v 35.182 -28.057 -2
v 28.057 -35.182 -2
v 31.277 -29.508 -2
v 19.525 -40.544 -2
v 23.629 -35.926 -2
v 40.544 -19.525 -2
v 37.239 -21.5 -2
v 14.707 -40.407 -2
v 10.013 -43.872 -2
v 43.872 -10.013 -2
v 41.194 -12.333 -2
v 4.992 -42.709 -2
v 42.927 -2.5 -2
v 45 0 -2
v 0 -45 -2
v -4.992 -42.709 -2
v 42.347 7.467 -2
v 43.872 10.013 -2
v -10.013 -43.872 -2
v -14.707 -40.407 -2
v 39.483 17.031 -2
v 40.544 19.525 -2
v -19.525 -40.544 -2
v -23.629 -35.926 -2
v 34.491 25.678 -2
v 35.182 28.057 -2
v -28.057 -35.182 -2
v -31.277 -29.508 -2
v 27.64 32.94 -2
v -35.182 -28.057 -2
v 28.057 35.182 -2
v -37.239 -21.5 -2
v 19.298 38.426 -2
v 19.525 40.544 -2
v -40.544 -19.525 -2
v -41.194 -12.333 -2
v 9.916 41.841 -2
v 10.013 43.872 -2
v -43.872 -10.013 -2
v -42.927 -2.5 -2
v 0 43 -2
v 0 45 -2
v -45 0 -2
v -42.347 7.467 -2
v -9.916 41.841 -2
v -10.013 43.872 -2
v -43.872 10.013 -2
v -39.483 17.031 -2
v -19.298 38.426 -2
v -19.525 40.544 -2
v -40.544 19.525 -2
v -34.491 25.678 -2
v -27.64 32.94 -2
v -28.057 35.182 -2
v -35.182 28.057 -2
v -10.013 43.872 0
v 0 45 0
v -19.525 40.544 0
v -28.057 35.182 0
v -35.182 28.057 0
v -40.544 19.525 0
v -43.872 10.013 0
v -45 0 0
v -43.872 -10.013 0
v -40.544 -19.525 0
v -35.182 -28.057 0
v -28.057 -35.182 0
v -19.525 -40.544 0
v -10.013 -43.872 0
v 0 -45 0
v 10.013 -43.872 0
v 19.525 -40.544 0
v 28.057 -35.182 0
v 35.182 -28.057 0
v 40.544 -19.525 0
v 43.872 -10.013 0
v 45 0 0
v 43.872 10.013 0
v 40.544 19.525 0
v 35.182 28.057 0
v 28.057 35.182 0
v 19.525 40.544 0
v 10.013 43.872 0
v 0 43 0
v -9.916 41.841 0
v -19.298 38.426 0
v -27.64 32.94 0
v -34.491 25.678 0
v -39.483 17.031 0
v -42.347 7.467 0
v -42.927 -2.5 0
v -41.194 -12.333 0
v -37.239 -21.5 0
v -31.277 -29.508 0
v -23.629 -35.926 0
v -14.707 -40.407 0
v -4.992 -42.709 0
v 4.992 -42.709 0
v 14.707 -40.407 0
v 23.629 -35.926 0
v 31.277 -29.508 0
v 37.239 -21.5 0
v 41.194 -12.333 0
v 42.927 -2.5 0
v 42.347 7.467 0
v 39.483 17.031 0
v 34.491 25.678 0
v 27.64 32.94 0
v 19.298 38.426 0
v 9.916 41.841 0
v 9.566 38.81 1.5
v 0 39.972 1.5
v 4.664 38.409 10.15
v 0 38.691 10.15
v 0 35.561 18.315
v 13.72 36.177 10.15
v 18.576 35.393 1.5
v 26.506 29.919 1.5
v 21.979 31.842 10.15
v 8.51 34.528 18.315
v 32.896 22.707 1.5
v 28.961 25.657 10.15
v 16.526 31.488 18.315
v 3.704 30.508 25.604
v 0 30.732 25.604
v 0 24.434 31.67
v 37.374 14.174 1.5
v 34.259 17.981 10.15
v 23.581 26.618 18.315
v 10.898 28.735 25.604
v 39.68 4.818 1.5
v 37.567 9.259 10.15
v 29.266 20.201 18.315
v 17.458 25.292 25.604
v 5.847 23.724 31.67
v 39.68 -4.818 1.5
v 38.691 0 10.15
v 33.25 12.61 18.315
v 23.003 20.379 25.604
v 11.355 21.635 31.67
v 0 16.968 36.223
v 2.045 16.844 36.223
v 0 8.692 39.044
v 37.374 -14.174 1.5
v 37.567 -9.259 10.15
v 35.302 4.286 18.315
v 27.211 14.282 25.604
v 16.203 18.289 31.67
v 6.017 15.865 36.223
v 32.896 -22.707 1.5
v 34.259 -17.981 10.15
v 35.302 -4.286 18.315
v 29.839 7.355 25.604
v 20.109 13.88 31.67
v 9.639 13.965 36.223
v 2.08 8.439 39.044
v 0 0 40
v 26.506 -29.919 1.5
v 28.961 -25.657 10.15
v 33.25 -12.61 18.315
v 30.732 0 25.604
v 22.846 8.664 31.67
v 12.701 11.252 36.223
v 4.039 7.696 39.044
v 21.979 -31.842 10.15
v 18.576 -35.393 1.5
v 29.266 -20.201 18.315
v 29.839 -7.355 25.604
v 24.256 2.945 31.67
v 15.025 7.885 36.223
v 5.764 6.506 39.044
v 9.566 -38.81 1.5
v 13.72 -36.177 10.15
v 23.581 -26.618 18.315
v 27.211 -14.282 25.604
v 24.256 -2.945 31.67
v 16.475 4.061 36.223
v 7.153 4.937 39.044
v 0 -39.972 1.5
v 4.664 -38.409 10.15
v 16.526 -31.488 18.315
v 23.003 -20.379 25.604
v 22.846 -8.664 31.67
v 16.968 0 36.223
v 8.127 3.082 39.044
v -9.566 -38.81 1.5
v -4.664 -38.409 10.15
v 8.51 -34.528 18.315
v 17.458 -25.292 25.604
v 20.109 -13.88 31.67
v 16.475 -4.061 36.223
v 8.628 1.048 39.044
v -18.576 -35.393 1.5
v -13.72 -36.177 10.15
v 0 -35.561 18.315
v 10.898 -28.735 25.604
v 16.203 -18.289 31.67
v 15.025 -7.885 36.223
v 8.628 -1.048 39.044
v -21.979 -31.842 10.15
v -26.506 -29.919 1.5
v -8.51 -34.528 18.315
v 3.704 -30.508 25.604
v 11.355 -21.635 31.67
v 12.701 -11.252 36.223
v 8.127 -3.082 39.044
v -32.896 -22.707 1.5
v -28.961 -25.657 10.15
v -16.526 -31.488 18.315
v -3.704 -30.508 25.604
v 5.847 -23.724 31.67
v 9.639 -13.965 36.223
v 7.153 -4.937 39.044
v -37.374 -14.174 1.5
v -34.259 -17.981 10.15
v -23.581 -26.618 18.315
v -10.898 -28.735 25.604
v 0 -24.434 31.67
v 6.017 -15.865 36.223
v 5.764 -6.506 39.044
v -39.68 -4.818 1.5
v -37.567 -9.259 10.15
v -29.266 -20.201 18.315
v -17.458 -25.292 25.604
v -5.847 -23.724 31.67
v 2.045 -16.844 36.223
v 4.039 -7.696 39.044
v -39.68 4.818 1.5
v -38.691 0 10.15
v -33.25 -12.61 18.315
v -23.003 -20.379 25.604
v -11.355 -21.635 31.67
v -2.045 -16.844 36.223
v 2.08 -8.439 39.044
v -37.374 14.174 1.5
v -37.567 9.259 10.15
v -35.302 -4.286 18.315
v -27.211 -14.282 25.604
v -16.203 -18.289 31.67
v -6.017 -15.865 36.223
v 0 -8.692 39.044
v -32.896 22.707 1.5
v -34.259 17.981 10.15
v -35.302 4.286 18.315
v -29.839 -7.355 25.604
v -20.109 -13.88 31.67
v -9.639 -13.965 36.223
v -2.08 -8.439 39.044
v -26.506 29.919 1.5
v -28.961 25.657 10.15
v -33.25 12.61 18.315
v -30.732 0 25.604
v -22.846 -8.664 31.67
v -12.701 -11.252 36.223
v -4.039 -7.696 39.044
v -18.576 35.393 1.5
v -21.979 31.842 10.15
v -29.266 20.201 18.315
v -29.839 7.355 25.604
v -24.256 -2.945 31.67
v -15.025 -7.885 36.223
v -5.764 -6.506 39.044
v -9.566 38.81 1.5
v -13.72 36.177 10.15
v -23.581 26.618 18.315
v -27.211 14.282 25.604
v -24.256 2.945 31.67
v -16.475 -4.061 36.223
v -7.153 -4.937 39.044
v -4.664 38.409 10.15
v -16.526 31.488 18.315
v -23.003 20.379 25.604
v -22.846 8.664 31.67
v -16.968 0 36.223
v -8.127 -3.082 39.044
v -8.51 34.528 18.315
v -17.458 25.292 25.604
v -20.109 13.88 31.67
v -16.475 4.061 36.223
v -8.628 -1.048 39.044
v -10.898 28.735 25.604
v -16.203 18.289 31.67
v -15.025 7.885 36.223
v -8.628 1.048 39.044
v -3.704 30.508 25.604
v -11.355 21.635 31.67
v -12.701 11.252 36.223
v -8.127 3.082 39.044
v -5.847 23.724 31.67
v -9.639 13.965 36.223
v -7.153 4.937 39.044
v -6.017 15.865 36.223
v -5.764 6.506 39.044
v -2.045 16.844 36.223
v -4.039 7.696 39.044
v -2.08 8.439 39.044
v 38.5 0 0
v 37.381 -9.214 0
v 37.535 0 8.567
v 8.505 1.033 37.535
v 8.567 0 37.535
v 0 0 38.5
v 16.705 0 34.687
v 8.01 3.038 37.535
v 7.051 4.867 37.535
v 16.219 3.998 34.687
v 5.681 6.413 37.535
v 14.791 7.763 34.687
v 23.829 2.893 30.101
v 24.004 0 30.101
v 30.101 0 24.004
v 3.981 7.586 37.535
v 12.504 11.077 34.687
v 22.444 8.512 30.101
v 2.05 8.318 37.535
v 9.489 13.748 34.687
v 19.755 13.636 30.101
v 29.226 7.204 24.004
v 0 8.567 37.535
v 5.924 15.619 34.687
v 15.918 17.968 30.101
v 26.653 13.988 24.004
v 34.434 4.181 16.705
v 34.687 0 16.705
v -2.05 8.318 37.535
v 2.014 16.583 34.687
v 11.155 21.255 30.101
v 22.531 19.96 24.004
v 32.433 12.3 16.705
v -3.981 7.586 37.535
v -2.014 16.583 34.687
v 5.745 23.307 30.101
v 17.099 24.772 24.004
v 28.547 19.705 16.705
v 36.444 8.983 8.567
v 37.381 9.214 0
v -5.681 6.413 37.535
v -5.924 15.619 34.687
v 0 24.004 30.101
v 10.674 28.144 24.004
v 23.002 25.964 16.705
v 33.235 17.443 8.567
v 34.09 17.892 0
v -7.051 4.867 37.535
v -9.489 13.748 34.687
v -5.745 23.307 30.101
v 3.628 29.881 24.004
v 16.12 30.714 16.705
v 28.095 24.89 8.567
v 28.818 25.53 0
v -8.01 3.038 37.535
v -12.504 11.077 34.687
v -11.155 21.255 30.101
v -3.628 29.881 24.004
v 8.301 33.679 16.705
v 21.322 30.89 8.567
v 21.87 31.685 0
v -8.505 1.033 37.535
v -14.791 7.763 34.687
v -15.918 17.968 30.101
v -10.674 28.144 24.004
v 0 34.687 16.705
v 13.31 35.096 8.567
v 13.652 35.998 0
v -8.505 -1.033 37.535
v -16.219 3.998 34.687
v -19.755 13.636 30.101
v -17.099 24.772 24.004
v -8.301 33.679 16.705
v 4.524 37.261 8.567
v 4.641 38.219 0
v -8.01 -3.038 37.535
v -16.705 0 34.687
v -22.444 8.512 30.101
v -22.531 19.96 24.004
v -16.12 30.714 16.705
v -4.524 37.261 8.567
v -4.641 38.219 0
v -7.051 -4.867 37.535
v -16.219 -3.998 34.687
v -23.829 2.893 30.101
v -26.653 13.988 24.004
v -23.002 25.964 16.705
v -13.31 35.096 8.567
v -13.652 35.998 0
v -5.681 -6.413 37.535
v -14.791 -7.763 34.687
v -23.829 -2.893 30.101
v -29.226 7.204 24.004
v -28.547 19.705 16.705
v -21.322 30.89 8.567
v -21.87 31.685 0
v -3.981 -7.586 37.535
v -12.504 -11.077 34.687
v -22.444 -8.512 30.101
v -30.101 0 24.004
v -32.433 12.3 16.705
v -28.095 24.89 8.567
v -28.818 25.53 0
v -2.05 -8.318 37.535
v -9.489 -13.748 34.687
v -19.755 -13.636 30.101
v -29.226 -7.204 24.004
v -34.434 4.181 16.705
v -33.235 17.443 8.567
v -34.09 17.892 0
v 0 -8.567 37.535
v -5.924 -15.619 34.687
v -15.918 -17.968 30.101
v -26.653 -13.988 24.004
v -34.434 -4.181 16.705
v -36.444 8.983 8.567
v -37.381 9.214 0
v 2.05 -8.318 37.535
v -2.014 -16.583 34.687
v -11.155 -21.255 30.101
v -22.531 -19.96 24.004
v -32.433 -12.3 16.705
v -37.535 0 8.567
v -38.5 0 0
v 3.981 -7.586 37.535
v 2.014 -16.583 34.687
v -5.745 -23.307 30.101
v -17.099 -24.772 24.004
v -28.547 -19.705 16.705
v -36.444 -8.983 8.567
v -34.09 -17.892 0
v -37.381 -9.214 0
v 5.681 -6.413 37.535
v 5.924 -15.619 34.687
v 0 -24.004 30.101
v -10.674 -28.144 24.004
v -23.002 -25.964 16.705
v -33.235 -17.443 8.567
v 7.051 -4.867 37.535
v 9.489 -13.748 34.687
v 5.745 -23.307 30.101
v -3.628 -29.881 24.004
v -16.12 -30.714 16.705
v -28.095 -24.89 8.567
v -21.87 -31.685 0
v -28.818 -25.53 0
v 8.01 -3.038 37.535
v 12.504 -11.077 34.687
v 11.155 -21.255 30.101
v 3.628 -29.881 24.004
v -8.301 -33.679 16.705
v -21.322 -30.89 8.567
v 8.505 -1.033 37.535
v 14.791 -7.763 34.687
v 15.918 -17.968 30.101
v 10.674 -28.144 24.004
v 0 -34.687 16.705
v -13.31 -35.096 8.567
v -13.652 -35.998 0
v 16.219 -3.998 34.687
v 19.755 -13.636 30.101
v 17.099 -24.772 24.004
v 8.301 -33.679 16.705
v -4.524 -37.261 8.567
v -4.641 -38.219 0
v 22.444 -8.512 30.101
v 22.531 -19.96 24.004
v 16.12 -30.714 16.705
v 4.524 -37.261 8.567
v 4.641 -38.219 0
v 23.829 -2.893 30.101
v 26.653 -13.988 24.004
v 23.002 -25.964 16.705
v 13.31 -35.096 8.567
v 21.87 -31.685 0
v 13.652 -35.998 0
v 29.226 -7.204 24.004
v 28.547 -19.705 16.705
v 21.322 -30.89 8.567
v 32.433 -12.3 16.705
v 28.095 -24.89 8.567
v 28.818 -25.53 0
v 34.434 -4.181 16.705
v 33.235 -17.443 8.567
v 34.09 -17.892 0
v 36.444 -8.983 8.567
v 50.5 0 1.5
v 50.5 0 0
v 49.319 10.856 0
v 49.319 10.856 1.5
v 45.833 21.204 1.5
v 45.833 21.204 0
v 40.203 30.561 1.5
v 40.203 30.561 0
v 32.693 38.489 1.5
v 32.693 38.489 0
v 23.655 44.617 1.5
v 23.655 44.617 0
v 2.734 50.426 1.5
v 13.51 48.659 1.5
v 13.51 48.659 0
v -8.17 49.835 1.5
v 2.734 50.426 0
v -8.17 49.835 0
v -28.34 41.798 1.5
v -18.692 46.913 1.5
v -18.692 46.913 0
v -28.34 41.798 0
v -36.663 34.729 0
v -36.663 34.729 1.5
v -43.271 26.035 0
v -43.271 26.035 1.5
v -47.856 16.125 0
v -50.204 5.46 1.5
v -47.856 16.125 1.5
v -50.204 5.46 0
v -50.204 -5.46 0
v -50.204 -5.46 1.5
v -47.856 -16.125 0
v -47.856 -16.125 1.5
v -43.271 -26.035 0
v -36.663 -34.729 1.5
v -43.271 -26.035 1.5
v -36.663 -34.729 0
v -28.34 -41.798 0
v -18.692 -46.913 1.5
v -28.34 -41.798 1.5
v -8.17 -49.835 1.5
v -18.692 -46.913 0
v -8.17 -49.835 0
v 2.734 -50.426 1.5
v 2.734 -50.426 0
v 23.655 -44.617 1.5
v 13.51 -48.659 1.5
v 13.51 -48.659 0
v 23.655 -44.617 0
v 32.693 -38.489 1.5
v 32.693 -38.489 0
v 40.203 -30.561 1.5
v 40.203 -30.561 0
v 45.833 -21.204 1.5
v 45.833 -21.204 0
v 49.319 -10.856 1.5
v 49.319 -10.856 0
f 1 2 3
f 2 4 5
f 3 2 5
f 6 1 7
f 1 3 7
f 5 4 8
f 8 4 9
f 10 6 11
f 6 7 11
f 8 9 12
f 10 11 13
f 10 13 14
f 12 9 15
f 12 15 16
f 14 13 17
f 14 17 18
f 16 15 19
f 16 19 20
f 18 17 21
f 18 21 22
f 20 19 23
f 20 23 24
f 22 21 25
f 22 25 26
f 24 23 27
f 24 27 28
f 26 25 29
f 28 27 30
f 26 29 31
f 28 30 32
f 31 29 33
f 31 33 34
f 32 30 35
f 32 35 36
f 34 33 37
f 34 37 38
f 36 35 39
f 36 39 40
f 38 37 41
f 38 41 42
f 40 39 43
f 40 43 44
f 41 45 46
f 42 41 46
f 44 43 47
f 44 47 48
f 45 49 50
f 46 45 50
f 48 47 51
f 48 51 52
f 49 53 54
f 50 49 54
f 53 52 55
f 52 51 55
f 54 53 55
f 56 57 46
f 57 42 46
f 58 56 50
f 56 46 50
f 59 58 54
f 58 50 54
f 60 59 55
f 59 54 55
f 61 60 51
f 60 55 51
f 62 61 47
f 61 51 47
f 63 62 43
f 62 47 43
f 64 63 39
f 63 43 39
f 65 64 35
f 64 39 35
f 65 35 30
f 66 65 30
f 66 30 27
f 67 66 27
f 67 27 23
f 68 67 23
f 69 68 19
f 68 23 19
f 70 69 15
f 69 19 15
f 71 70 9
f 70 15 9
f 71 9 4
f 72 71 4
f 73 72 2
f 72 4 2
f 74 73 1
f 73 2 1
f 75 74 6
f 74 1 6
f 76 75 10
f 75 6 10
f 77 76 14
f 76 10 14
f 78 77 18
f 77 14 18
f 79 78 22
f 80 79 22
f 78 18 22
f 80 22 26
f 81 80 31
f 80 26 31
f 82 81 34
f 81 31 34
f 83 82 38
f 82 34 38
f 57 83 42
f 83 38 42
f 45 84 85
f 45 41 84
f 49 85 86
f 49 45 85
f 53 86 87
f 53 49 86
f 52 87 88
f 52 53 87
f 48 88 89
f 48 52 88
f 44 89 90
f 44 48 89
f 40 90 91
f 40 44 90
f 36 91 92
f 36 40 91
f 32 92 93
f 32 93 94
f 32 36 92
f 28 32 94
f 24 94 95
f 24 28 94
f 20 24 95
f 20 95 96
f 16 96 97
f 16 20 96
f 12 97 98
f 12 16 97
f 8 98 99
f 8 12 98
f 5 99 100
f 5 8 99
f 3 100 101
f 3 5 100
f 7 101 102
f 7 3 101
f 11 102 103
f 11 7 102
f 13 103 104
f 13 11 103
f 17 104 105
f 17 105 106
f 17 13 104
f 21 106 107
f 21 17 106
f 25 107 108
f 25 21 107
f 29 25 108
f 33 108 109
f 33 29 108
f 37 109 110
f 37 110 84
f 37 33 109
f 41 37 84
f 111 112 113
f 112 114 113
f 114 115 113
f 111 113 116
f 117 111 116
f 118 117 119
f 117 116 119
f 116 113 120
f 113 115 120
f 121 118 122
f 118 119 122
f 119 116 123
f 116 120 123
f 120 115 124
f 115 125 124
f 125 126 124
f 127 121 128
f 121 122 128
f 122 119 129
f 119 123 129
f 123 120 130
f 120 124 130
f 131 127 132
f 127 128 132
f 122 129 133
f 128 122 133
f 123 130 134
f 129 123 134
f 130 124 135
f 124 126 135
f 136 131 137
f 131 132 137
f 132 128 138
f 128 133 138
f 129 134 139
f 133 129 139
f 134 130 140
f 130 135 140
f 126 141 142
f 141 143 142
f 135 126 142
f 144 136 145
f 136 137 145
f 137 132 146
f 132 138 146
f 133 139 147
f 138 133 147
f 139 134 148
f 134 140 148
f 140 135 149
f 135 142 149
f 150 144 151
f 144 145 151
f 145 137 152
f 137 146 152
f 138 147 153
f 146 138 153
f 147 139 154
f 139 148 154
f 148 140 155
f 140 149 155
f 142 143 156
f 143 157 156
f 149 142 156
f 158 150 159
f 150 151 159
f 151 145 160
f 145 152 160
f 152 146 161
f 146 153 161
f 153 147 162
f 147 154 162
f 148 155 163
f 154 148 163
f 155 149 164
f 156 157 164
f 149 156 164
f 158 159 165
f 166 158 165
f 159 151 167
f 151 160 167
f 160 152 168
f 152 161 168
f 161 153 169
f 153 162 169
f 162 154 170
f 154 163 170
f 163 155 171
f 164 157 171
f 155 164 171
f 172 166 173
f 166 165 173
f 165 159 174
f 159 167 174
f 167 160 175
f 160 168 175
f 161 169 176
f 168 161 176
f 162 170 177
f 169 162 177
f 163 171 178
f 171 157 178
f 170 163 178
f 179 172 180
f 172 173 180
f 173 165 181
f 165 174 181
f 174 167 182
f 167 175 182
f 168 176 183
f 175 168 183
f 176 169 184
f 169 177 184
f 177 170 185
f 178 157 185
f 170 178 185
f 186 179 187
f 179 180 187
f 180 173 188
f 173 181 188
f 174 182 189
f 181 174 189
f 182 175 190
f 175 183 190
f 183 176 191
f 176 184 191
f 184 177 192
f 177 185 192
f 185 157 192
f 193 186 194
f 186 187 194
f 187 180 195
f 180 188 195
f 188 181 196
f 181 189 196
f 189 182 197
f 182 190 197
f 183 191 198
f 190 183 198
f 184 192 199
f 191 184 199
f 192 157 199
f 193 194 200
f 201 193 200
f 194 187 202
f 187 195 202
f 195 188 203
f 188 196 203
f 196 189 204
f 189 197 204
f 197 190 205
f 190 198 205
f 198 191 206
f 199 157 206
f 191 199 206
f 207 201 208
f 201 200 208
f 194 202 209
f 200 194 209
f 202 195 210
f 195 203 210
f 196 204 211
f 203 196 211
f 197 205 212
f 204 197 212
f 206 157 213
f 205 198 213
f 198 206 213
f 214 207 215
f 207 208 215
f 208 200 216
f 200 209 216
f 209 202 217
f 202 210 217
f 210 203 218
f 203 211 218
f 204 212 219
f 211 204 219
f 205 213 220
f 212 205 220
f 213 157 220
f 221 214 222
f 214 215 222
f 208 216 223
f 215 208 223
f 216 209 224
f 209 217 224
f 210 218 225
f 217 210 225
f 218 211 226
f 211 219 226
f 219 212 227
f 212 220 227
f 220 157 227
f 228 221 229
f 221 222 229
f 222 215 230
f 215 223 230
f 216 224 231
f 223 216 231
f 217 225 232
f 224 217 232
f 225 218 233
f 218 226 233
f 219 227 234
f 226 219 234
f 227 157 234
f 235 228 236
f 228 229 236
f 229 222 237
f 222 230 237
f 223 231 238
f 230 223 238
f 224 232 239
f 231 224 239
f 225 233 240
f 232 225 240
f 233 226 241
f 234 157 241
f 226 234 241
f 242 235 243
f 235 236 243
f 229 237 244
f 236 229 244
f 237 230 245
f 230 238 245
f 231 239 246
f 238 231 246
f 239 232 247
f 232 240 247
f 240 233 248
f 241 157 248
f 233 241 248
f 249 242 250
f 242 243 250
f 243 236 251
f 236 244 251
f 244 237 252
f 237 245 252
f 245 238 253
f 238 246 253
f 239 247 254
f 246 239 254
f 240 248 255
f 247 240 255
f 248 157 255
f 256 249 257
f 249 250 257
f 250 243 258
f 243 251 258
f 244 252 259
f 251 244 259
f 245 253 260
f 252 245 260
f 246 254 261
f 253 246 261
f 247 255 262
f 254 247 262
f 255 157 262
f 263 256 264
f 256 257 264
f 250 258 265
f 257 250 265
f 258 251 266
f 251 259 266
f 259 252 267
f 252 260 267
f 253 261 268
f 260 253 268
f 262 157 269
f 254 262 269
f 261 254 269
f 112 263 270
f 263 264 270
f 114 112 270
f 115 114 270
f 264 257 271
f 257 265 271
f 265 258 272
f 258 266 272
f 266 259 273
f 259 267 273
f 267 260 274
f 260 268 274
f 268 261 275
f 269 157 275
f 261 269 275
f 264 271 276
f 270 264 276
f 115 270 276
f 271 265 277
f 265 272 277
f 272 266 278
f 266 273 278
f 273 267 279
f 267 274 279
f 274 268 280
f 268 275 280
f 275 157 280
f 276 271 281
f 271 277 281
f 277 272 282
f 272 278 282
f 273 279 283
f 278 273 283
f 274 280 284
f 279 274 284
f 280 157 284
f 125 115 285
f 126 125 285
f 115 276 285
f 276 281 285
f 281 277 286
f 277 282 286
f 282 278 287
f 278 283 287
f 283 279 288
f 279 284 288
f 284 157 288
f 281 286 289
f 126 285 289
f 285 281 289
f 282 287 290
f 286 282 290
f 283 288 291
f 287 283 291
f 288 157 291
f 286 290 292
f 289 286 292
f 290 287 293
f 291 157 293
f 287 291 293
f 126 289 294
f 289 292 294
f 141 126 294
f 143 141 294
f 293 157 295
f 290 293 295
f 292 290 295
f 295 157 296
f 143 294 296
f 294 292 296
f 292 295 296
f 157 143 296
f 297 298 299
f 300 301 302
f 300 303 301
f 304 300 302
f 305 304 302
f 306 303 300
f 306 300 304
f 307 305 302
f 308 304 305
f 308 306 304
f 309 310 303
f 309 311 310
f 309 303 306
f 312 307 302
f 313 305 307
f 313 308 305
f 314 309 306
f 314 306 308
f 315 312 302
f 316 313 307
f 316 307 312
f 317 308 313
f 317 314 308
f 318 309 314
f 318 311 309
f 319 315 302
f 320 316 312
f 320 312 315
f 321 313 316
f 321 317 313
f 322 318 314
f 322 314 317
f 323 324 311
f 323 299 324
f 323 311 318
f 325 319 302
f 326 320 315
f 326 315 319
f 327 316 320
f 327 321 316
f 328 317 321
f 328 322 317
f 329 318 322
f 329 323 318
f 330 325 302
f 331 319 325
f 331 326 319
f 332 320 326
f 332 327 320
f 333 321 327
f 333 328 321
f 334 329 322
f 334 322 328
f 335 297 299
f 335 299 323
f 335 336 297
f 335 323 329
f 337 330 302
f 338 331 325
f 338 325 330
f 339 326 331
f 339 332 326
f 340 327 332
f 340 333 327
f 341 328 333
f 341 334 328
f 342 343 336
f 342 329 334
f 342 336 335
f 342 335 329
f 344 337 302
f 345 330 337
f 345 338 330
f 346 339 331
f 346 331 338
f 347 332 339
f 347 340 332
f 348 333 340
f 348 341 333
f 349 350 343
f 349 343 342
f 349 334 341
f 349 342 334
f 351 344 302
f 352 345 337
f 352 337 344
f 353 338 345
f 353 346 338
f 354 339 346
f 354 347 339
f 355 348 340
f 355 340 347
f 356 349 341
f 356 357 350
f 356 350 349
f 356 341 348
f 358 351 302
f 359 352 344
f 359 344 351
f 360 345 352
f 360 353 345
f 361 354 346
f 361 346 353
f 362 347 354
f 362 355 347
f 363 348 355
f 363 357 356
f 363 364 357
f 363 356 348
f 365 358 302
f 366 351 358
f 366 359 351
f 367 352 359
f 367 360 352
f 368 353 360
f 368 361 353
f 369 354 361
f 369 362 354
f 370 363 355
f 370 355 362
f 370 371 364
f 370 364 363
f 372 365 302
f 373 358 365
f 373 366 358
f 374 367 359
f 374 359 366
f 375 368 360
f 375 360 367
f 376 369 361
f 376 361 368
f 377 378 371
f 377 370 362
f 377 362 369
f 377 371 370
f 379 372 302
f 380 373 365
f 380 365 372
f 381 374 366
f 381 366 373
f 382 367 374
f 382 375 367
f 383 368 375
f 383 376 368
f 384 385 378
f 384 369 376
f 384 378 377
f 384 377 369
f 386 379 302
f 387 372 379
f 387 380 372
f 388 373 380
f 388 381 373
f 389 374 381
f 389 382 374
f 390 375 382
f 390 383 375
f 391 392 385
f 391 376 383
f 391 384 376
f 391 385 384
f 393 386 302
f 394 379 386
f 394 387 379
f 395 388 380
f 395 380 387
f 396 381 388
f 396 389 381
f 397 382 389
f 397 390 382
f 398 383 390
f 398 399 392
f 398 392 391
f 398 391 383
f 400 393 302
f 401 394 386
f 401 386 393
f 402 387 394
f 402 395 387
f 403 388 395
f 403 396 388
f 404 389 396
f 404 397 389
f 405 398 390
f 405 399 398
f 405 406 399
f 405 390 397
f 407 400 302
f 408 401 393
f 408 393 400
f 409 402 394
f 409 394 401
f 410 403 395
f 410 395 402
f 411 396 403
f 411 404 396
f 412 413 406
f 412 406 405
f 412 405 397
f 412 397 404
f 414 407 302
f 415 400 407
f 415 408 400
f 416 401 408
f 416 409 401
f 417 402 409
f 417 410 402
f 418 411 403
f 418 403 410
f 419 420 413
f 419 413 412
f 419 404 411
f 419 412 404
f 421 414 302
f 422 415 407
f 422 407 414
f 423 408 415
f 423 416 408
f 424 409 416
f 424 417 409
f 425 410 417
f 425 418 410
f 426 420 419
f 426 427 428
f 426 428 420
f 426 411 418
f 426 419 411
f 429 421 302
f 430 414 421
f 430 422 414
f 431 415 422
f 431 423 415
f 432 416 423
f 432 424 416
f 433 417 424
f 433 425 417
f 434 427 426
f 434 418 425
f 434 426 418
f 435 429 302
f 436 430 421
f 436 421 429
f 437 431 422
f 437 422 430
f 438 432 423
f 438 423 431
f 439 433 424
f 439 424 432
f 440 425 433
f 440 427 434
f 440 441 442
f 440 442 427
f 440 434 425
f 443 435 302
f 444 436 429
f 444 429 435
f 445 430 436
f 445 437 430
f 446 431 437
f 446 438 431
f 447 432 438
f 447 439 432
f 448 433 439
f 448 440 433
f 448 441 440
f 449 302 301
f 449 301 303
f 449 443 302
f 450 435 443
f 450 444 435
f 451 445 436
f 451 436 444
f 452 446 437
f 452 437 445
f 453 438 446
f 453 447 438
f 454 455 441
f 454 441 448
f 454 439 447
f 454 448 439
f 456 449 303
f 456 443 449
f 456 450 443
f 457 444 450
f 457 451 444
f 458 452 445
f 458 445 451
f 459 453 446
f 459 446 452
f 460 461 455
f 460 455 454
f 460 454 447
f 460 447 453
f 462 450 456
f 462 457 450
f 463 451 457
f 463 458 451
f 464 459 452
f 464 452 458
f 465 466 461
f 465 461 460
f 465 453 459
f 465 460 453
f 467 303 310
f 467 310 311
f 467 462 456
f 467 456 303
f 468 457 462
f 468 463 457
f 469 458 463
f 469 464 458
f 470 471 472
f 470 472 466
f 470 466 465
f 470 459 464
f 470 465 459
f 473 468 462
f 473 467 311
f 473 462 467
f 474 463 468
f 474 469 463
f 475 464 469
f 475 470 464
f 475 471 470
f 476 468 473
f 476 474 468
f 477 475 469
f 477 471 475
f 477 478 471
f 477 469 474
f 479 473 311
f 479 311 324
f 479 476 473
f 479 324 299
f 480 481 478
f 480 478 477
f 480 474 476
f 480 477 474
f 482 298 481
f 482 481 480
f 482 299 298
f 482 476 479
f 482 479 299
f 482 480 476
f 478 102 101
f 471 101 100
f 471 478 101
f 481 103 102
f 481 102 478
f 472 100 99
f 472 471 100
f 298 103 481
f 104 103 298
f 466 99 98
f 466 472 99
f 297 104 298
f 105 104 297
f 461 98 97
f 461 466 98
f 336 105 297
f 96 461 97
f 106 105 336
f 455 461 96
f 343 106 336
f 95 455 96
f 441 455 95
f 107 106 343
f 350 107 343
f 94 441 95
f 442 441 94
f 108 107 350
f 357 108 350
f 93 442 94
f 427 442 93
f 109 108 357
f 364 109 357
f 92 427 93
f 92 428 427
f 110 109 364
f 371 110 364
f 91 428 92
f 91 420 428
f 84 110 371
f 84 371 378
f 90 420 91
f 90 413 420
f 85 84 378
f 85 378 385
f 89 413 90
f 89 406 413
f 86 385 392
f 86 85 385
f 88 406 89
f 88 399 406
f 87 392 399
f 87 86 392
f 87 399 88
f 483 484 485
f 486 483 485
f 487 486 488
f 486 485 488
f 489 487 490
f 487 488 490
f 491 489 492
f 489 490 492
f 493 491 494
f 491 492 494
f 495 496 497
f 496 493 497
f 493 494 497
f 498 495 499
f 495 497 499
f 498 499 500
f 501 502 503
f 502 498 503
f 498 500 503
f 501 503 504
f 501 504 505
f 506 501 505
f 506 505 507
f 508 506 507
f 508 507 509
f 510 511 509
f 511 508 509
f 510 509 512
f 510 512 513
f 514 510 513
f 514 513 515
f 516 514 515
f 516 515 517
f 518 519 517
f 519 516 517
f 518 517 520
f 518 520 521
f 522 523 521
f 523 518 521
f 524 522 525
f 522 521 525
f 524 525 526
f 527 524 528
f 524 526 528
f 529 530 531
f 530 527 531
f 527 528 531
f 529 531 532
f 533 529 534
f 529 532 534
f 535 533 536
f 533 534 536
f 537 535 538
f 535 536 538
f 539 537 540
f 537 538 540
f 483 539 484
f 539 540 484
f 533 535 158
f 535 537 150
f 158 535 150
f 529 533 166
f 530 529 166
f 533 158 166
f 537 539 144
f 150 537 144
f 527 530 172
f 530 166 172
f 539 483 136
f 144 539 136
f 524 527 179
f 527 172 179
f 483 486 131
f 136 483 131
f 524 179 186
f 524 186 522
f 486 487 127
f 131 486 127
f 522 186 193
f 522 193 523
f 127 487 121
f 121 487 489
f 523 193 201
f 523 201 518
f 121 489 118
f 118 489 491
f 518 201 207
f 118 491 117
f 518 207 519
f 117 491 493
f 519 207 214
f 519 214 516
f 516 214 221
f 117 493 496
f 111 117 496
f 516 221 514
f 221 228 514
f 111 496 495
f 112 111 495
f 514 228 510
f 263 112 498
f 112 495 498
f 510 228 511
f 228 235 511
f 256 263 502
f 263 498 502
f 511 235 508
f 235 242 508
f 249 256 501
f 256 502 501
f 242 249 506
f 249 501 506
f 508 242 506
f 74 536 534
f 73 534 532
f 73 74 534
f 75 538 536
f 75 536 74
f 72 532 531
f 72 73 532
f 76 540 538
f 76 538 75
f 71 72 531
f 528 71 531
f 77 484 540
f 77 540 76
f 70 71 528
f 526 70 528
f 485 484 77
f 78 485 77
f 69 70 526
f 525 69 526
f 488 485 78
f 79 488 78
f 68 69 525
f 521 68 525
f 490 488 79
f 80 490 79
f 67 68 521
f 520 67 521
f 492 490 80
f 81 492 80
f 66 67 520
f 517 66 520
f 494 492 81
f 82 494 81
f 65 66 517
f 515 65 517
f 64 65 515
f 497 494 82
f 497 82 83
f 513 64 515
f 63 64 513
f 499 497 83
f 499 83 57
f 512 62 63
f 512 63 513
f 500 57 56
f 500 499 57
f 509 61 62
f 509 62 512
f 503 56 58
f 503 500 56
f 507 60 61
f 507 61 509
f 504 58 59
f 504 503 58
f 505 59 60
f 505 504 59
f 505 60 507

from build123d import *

# Parameters (mm, degrees)
SKETCH_2_R               = 101.541015805
CUT_EXTRUDE_1_DEPTH      = 92
SKETCH_4_R               = 60
SKETCH_4_R_2             = 39
EXTRUDE_1_DEPTH          = 1.5
SKETCH_5_W               = 2
SKETCH_5_H               = 2
CUT_EXTRUDE_2_DEPTH      = 94.808315196
CUT_EXTRUDE_2_DEPTH_BACK = 94.808315196
SKETCH_6_OUTSIDE_W       = 156.966
SKETCH_6_OUTSIDE_H       = 156.966
SKETCH_6_OUTSIDE_R       = 52.5
CUT_EXTRUDE_3_DEPTH      = 84.634622017
CUT_EXTRUDE_3_DEPTH_BACK = 84.634622017
SKETCH_7_OUTSIDE_W       = 137.864
SKETCH_7_OUTSIDE_H       = 137.864
SKETCH_7_OUTSIDE_R       = 50.5


with BuildPart() as part:
    # 草图1 → 旋转1 (revolve)
    with BuildSketch(Plane(origin=(0, 0, 0), x_dir=(0, 0, -1), z_dir=(1, 0, 0))):
        with BuildLine():
            Line((-40, 0), (40, 0))
            ThreePointArc((40, 0), (0, 40), (-40, 0))
        make_face()
    revolve(axis=Axis((0, 0, 40), (0, 0, -1)))

    # 草图2 → 切除-拉伸1 (cut)
    with BuildSketch(Plane.XY):
        with Locations((-18.762206379, 13.237665106)):
            Circle(SKETCH_2_R)
    extrude(amount=-CUT_EXTRUDE_1_DEPTH, mode=Mode.SUBTRACT)

    # 草图3 → 切除-旋转1 (revolve, cut)
    with BuildSketch(Plane(origin=(0, 0, 0), x_dir=(1, 0, 0), z_dir=(0, 1, 0))):
        with BuildLine():
            Line((0, 38.5), (0, -38.5))
            ThreePointArc((0, -38.5), (38.5, 0), (0, 38.5))
        make_face()
    revolve(axis=Axis((0, 0, -38.5), (0, 0, 1)), mode=Mode.SUBTRACT)

    # 草图4 → 凸台-拉伸1 (add)
    with BuildSketch(Plane(origin=(0, 0, 0), x_dir=(-1, 0, 0), z_dir=(0, 0, -1))):
        Circle(SKETCH_4_R)
        Circle(SKETCH_4_R_2, mode=Mode.SUBTRACT)
    extrude(amount=-EXTRUDE_1_DEPTH)

    # 草图5 → 旋转2 (revolve)
    with BuildSketch(Plane(origin=(0, 0, 0), x_dir=(1, 0, 0), z_dir=(0, 1, 0)), mode=Mode.PRIVATE) as revolve_2_sk:
        with Locations((-44, 1)):
            Rectangle(SKETCH_5_W, SKETCH_5_H)
    revolve(revolve_2_sk.sketch.rotate(Axis((0, 0, -24.660694069), (0, 0, 1)), 270), axis=Axis((0, 0, -24.660694069), (0, 0, 1)))

    # 草图6 outside → 切除-拉伸2 (cut, two sides: drawn at the far end of the back side and taken through both)
    with BuildSketch(Plane(origin=(0, 0, 0), x_dir=(-1, 0, 0), z_dir=(0, 0, -1)).offset(-CUT_EXTRUDE_2_DEPTH_BACK)):
        Rectangle(SKETCH_6_OUTSIDE_W, SKETCH_6_OUTSIDE_H)
        Circle(SKETCH_6_OUTSIDE_R, mode=Mode.SUBTRACT)
    extrude(amount=CUT_EXTRUDE_2_DEPTH + CUT_EXTRUDE_2_DEPTH_BACK, mode=Mode.SUBTRACT)

    # 草图7 outside → 切除-拉伸3 (cut, two sides: drawn at the far end of the back side and taken through both)
    with BuildSketch(Plane.XY.offset(1.5).offset(-CUT_EXTRUDE_3_DEPTH_BACK)):
        Rectangle(SKETCH_7_OUTSIDE_W, SKETCH_7_OUTSIDE_H)
        Circle(SKETCH_7_OUTSIDE_R, mode=Mode.SUBTRACT)
    extrude(amount=CUT_EXTRUDE_3_DEPTH + CUT_EXTRUDE_3_DEPTH_BACK, mode=Mode.SUBTRACT)


solid = part.part
